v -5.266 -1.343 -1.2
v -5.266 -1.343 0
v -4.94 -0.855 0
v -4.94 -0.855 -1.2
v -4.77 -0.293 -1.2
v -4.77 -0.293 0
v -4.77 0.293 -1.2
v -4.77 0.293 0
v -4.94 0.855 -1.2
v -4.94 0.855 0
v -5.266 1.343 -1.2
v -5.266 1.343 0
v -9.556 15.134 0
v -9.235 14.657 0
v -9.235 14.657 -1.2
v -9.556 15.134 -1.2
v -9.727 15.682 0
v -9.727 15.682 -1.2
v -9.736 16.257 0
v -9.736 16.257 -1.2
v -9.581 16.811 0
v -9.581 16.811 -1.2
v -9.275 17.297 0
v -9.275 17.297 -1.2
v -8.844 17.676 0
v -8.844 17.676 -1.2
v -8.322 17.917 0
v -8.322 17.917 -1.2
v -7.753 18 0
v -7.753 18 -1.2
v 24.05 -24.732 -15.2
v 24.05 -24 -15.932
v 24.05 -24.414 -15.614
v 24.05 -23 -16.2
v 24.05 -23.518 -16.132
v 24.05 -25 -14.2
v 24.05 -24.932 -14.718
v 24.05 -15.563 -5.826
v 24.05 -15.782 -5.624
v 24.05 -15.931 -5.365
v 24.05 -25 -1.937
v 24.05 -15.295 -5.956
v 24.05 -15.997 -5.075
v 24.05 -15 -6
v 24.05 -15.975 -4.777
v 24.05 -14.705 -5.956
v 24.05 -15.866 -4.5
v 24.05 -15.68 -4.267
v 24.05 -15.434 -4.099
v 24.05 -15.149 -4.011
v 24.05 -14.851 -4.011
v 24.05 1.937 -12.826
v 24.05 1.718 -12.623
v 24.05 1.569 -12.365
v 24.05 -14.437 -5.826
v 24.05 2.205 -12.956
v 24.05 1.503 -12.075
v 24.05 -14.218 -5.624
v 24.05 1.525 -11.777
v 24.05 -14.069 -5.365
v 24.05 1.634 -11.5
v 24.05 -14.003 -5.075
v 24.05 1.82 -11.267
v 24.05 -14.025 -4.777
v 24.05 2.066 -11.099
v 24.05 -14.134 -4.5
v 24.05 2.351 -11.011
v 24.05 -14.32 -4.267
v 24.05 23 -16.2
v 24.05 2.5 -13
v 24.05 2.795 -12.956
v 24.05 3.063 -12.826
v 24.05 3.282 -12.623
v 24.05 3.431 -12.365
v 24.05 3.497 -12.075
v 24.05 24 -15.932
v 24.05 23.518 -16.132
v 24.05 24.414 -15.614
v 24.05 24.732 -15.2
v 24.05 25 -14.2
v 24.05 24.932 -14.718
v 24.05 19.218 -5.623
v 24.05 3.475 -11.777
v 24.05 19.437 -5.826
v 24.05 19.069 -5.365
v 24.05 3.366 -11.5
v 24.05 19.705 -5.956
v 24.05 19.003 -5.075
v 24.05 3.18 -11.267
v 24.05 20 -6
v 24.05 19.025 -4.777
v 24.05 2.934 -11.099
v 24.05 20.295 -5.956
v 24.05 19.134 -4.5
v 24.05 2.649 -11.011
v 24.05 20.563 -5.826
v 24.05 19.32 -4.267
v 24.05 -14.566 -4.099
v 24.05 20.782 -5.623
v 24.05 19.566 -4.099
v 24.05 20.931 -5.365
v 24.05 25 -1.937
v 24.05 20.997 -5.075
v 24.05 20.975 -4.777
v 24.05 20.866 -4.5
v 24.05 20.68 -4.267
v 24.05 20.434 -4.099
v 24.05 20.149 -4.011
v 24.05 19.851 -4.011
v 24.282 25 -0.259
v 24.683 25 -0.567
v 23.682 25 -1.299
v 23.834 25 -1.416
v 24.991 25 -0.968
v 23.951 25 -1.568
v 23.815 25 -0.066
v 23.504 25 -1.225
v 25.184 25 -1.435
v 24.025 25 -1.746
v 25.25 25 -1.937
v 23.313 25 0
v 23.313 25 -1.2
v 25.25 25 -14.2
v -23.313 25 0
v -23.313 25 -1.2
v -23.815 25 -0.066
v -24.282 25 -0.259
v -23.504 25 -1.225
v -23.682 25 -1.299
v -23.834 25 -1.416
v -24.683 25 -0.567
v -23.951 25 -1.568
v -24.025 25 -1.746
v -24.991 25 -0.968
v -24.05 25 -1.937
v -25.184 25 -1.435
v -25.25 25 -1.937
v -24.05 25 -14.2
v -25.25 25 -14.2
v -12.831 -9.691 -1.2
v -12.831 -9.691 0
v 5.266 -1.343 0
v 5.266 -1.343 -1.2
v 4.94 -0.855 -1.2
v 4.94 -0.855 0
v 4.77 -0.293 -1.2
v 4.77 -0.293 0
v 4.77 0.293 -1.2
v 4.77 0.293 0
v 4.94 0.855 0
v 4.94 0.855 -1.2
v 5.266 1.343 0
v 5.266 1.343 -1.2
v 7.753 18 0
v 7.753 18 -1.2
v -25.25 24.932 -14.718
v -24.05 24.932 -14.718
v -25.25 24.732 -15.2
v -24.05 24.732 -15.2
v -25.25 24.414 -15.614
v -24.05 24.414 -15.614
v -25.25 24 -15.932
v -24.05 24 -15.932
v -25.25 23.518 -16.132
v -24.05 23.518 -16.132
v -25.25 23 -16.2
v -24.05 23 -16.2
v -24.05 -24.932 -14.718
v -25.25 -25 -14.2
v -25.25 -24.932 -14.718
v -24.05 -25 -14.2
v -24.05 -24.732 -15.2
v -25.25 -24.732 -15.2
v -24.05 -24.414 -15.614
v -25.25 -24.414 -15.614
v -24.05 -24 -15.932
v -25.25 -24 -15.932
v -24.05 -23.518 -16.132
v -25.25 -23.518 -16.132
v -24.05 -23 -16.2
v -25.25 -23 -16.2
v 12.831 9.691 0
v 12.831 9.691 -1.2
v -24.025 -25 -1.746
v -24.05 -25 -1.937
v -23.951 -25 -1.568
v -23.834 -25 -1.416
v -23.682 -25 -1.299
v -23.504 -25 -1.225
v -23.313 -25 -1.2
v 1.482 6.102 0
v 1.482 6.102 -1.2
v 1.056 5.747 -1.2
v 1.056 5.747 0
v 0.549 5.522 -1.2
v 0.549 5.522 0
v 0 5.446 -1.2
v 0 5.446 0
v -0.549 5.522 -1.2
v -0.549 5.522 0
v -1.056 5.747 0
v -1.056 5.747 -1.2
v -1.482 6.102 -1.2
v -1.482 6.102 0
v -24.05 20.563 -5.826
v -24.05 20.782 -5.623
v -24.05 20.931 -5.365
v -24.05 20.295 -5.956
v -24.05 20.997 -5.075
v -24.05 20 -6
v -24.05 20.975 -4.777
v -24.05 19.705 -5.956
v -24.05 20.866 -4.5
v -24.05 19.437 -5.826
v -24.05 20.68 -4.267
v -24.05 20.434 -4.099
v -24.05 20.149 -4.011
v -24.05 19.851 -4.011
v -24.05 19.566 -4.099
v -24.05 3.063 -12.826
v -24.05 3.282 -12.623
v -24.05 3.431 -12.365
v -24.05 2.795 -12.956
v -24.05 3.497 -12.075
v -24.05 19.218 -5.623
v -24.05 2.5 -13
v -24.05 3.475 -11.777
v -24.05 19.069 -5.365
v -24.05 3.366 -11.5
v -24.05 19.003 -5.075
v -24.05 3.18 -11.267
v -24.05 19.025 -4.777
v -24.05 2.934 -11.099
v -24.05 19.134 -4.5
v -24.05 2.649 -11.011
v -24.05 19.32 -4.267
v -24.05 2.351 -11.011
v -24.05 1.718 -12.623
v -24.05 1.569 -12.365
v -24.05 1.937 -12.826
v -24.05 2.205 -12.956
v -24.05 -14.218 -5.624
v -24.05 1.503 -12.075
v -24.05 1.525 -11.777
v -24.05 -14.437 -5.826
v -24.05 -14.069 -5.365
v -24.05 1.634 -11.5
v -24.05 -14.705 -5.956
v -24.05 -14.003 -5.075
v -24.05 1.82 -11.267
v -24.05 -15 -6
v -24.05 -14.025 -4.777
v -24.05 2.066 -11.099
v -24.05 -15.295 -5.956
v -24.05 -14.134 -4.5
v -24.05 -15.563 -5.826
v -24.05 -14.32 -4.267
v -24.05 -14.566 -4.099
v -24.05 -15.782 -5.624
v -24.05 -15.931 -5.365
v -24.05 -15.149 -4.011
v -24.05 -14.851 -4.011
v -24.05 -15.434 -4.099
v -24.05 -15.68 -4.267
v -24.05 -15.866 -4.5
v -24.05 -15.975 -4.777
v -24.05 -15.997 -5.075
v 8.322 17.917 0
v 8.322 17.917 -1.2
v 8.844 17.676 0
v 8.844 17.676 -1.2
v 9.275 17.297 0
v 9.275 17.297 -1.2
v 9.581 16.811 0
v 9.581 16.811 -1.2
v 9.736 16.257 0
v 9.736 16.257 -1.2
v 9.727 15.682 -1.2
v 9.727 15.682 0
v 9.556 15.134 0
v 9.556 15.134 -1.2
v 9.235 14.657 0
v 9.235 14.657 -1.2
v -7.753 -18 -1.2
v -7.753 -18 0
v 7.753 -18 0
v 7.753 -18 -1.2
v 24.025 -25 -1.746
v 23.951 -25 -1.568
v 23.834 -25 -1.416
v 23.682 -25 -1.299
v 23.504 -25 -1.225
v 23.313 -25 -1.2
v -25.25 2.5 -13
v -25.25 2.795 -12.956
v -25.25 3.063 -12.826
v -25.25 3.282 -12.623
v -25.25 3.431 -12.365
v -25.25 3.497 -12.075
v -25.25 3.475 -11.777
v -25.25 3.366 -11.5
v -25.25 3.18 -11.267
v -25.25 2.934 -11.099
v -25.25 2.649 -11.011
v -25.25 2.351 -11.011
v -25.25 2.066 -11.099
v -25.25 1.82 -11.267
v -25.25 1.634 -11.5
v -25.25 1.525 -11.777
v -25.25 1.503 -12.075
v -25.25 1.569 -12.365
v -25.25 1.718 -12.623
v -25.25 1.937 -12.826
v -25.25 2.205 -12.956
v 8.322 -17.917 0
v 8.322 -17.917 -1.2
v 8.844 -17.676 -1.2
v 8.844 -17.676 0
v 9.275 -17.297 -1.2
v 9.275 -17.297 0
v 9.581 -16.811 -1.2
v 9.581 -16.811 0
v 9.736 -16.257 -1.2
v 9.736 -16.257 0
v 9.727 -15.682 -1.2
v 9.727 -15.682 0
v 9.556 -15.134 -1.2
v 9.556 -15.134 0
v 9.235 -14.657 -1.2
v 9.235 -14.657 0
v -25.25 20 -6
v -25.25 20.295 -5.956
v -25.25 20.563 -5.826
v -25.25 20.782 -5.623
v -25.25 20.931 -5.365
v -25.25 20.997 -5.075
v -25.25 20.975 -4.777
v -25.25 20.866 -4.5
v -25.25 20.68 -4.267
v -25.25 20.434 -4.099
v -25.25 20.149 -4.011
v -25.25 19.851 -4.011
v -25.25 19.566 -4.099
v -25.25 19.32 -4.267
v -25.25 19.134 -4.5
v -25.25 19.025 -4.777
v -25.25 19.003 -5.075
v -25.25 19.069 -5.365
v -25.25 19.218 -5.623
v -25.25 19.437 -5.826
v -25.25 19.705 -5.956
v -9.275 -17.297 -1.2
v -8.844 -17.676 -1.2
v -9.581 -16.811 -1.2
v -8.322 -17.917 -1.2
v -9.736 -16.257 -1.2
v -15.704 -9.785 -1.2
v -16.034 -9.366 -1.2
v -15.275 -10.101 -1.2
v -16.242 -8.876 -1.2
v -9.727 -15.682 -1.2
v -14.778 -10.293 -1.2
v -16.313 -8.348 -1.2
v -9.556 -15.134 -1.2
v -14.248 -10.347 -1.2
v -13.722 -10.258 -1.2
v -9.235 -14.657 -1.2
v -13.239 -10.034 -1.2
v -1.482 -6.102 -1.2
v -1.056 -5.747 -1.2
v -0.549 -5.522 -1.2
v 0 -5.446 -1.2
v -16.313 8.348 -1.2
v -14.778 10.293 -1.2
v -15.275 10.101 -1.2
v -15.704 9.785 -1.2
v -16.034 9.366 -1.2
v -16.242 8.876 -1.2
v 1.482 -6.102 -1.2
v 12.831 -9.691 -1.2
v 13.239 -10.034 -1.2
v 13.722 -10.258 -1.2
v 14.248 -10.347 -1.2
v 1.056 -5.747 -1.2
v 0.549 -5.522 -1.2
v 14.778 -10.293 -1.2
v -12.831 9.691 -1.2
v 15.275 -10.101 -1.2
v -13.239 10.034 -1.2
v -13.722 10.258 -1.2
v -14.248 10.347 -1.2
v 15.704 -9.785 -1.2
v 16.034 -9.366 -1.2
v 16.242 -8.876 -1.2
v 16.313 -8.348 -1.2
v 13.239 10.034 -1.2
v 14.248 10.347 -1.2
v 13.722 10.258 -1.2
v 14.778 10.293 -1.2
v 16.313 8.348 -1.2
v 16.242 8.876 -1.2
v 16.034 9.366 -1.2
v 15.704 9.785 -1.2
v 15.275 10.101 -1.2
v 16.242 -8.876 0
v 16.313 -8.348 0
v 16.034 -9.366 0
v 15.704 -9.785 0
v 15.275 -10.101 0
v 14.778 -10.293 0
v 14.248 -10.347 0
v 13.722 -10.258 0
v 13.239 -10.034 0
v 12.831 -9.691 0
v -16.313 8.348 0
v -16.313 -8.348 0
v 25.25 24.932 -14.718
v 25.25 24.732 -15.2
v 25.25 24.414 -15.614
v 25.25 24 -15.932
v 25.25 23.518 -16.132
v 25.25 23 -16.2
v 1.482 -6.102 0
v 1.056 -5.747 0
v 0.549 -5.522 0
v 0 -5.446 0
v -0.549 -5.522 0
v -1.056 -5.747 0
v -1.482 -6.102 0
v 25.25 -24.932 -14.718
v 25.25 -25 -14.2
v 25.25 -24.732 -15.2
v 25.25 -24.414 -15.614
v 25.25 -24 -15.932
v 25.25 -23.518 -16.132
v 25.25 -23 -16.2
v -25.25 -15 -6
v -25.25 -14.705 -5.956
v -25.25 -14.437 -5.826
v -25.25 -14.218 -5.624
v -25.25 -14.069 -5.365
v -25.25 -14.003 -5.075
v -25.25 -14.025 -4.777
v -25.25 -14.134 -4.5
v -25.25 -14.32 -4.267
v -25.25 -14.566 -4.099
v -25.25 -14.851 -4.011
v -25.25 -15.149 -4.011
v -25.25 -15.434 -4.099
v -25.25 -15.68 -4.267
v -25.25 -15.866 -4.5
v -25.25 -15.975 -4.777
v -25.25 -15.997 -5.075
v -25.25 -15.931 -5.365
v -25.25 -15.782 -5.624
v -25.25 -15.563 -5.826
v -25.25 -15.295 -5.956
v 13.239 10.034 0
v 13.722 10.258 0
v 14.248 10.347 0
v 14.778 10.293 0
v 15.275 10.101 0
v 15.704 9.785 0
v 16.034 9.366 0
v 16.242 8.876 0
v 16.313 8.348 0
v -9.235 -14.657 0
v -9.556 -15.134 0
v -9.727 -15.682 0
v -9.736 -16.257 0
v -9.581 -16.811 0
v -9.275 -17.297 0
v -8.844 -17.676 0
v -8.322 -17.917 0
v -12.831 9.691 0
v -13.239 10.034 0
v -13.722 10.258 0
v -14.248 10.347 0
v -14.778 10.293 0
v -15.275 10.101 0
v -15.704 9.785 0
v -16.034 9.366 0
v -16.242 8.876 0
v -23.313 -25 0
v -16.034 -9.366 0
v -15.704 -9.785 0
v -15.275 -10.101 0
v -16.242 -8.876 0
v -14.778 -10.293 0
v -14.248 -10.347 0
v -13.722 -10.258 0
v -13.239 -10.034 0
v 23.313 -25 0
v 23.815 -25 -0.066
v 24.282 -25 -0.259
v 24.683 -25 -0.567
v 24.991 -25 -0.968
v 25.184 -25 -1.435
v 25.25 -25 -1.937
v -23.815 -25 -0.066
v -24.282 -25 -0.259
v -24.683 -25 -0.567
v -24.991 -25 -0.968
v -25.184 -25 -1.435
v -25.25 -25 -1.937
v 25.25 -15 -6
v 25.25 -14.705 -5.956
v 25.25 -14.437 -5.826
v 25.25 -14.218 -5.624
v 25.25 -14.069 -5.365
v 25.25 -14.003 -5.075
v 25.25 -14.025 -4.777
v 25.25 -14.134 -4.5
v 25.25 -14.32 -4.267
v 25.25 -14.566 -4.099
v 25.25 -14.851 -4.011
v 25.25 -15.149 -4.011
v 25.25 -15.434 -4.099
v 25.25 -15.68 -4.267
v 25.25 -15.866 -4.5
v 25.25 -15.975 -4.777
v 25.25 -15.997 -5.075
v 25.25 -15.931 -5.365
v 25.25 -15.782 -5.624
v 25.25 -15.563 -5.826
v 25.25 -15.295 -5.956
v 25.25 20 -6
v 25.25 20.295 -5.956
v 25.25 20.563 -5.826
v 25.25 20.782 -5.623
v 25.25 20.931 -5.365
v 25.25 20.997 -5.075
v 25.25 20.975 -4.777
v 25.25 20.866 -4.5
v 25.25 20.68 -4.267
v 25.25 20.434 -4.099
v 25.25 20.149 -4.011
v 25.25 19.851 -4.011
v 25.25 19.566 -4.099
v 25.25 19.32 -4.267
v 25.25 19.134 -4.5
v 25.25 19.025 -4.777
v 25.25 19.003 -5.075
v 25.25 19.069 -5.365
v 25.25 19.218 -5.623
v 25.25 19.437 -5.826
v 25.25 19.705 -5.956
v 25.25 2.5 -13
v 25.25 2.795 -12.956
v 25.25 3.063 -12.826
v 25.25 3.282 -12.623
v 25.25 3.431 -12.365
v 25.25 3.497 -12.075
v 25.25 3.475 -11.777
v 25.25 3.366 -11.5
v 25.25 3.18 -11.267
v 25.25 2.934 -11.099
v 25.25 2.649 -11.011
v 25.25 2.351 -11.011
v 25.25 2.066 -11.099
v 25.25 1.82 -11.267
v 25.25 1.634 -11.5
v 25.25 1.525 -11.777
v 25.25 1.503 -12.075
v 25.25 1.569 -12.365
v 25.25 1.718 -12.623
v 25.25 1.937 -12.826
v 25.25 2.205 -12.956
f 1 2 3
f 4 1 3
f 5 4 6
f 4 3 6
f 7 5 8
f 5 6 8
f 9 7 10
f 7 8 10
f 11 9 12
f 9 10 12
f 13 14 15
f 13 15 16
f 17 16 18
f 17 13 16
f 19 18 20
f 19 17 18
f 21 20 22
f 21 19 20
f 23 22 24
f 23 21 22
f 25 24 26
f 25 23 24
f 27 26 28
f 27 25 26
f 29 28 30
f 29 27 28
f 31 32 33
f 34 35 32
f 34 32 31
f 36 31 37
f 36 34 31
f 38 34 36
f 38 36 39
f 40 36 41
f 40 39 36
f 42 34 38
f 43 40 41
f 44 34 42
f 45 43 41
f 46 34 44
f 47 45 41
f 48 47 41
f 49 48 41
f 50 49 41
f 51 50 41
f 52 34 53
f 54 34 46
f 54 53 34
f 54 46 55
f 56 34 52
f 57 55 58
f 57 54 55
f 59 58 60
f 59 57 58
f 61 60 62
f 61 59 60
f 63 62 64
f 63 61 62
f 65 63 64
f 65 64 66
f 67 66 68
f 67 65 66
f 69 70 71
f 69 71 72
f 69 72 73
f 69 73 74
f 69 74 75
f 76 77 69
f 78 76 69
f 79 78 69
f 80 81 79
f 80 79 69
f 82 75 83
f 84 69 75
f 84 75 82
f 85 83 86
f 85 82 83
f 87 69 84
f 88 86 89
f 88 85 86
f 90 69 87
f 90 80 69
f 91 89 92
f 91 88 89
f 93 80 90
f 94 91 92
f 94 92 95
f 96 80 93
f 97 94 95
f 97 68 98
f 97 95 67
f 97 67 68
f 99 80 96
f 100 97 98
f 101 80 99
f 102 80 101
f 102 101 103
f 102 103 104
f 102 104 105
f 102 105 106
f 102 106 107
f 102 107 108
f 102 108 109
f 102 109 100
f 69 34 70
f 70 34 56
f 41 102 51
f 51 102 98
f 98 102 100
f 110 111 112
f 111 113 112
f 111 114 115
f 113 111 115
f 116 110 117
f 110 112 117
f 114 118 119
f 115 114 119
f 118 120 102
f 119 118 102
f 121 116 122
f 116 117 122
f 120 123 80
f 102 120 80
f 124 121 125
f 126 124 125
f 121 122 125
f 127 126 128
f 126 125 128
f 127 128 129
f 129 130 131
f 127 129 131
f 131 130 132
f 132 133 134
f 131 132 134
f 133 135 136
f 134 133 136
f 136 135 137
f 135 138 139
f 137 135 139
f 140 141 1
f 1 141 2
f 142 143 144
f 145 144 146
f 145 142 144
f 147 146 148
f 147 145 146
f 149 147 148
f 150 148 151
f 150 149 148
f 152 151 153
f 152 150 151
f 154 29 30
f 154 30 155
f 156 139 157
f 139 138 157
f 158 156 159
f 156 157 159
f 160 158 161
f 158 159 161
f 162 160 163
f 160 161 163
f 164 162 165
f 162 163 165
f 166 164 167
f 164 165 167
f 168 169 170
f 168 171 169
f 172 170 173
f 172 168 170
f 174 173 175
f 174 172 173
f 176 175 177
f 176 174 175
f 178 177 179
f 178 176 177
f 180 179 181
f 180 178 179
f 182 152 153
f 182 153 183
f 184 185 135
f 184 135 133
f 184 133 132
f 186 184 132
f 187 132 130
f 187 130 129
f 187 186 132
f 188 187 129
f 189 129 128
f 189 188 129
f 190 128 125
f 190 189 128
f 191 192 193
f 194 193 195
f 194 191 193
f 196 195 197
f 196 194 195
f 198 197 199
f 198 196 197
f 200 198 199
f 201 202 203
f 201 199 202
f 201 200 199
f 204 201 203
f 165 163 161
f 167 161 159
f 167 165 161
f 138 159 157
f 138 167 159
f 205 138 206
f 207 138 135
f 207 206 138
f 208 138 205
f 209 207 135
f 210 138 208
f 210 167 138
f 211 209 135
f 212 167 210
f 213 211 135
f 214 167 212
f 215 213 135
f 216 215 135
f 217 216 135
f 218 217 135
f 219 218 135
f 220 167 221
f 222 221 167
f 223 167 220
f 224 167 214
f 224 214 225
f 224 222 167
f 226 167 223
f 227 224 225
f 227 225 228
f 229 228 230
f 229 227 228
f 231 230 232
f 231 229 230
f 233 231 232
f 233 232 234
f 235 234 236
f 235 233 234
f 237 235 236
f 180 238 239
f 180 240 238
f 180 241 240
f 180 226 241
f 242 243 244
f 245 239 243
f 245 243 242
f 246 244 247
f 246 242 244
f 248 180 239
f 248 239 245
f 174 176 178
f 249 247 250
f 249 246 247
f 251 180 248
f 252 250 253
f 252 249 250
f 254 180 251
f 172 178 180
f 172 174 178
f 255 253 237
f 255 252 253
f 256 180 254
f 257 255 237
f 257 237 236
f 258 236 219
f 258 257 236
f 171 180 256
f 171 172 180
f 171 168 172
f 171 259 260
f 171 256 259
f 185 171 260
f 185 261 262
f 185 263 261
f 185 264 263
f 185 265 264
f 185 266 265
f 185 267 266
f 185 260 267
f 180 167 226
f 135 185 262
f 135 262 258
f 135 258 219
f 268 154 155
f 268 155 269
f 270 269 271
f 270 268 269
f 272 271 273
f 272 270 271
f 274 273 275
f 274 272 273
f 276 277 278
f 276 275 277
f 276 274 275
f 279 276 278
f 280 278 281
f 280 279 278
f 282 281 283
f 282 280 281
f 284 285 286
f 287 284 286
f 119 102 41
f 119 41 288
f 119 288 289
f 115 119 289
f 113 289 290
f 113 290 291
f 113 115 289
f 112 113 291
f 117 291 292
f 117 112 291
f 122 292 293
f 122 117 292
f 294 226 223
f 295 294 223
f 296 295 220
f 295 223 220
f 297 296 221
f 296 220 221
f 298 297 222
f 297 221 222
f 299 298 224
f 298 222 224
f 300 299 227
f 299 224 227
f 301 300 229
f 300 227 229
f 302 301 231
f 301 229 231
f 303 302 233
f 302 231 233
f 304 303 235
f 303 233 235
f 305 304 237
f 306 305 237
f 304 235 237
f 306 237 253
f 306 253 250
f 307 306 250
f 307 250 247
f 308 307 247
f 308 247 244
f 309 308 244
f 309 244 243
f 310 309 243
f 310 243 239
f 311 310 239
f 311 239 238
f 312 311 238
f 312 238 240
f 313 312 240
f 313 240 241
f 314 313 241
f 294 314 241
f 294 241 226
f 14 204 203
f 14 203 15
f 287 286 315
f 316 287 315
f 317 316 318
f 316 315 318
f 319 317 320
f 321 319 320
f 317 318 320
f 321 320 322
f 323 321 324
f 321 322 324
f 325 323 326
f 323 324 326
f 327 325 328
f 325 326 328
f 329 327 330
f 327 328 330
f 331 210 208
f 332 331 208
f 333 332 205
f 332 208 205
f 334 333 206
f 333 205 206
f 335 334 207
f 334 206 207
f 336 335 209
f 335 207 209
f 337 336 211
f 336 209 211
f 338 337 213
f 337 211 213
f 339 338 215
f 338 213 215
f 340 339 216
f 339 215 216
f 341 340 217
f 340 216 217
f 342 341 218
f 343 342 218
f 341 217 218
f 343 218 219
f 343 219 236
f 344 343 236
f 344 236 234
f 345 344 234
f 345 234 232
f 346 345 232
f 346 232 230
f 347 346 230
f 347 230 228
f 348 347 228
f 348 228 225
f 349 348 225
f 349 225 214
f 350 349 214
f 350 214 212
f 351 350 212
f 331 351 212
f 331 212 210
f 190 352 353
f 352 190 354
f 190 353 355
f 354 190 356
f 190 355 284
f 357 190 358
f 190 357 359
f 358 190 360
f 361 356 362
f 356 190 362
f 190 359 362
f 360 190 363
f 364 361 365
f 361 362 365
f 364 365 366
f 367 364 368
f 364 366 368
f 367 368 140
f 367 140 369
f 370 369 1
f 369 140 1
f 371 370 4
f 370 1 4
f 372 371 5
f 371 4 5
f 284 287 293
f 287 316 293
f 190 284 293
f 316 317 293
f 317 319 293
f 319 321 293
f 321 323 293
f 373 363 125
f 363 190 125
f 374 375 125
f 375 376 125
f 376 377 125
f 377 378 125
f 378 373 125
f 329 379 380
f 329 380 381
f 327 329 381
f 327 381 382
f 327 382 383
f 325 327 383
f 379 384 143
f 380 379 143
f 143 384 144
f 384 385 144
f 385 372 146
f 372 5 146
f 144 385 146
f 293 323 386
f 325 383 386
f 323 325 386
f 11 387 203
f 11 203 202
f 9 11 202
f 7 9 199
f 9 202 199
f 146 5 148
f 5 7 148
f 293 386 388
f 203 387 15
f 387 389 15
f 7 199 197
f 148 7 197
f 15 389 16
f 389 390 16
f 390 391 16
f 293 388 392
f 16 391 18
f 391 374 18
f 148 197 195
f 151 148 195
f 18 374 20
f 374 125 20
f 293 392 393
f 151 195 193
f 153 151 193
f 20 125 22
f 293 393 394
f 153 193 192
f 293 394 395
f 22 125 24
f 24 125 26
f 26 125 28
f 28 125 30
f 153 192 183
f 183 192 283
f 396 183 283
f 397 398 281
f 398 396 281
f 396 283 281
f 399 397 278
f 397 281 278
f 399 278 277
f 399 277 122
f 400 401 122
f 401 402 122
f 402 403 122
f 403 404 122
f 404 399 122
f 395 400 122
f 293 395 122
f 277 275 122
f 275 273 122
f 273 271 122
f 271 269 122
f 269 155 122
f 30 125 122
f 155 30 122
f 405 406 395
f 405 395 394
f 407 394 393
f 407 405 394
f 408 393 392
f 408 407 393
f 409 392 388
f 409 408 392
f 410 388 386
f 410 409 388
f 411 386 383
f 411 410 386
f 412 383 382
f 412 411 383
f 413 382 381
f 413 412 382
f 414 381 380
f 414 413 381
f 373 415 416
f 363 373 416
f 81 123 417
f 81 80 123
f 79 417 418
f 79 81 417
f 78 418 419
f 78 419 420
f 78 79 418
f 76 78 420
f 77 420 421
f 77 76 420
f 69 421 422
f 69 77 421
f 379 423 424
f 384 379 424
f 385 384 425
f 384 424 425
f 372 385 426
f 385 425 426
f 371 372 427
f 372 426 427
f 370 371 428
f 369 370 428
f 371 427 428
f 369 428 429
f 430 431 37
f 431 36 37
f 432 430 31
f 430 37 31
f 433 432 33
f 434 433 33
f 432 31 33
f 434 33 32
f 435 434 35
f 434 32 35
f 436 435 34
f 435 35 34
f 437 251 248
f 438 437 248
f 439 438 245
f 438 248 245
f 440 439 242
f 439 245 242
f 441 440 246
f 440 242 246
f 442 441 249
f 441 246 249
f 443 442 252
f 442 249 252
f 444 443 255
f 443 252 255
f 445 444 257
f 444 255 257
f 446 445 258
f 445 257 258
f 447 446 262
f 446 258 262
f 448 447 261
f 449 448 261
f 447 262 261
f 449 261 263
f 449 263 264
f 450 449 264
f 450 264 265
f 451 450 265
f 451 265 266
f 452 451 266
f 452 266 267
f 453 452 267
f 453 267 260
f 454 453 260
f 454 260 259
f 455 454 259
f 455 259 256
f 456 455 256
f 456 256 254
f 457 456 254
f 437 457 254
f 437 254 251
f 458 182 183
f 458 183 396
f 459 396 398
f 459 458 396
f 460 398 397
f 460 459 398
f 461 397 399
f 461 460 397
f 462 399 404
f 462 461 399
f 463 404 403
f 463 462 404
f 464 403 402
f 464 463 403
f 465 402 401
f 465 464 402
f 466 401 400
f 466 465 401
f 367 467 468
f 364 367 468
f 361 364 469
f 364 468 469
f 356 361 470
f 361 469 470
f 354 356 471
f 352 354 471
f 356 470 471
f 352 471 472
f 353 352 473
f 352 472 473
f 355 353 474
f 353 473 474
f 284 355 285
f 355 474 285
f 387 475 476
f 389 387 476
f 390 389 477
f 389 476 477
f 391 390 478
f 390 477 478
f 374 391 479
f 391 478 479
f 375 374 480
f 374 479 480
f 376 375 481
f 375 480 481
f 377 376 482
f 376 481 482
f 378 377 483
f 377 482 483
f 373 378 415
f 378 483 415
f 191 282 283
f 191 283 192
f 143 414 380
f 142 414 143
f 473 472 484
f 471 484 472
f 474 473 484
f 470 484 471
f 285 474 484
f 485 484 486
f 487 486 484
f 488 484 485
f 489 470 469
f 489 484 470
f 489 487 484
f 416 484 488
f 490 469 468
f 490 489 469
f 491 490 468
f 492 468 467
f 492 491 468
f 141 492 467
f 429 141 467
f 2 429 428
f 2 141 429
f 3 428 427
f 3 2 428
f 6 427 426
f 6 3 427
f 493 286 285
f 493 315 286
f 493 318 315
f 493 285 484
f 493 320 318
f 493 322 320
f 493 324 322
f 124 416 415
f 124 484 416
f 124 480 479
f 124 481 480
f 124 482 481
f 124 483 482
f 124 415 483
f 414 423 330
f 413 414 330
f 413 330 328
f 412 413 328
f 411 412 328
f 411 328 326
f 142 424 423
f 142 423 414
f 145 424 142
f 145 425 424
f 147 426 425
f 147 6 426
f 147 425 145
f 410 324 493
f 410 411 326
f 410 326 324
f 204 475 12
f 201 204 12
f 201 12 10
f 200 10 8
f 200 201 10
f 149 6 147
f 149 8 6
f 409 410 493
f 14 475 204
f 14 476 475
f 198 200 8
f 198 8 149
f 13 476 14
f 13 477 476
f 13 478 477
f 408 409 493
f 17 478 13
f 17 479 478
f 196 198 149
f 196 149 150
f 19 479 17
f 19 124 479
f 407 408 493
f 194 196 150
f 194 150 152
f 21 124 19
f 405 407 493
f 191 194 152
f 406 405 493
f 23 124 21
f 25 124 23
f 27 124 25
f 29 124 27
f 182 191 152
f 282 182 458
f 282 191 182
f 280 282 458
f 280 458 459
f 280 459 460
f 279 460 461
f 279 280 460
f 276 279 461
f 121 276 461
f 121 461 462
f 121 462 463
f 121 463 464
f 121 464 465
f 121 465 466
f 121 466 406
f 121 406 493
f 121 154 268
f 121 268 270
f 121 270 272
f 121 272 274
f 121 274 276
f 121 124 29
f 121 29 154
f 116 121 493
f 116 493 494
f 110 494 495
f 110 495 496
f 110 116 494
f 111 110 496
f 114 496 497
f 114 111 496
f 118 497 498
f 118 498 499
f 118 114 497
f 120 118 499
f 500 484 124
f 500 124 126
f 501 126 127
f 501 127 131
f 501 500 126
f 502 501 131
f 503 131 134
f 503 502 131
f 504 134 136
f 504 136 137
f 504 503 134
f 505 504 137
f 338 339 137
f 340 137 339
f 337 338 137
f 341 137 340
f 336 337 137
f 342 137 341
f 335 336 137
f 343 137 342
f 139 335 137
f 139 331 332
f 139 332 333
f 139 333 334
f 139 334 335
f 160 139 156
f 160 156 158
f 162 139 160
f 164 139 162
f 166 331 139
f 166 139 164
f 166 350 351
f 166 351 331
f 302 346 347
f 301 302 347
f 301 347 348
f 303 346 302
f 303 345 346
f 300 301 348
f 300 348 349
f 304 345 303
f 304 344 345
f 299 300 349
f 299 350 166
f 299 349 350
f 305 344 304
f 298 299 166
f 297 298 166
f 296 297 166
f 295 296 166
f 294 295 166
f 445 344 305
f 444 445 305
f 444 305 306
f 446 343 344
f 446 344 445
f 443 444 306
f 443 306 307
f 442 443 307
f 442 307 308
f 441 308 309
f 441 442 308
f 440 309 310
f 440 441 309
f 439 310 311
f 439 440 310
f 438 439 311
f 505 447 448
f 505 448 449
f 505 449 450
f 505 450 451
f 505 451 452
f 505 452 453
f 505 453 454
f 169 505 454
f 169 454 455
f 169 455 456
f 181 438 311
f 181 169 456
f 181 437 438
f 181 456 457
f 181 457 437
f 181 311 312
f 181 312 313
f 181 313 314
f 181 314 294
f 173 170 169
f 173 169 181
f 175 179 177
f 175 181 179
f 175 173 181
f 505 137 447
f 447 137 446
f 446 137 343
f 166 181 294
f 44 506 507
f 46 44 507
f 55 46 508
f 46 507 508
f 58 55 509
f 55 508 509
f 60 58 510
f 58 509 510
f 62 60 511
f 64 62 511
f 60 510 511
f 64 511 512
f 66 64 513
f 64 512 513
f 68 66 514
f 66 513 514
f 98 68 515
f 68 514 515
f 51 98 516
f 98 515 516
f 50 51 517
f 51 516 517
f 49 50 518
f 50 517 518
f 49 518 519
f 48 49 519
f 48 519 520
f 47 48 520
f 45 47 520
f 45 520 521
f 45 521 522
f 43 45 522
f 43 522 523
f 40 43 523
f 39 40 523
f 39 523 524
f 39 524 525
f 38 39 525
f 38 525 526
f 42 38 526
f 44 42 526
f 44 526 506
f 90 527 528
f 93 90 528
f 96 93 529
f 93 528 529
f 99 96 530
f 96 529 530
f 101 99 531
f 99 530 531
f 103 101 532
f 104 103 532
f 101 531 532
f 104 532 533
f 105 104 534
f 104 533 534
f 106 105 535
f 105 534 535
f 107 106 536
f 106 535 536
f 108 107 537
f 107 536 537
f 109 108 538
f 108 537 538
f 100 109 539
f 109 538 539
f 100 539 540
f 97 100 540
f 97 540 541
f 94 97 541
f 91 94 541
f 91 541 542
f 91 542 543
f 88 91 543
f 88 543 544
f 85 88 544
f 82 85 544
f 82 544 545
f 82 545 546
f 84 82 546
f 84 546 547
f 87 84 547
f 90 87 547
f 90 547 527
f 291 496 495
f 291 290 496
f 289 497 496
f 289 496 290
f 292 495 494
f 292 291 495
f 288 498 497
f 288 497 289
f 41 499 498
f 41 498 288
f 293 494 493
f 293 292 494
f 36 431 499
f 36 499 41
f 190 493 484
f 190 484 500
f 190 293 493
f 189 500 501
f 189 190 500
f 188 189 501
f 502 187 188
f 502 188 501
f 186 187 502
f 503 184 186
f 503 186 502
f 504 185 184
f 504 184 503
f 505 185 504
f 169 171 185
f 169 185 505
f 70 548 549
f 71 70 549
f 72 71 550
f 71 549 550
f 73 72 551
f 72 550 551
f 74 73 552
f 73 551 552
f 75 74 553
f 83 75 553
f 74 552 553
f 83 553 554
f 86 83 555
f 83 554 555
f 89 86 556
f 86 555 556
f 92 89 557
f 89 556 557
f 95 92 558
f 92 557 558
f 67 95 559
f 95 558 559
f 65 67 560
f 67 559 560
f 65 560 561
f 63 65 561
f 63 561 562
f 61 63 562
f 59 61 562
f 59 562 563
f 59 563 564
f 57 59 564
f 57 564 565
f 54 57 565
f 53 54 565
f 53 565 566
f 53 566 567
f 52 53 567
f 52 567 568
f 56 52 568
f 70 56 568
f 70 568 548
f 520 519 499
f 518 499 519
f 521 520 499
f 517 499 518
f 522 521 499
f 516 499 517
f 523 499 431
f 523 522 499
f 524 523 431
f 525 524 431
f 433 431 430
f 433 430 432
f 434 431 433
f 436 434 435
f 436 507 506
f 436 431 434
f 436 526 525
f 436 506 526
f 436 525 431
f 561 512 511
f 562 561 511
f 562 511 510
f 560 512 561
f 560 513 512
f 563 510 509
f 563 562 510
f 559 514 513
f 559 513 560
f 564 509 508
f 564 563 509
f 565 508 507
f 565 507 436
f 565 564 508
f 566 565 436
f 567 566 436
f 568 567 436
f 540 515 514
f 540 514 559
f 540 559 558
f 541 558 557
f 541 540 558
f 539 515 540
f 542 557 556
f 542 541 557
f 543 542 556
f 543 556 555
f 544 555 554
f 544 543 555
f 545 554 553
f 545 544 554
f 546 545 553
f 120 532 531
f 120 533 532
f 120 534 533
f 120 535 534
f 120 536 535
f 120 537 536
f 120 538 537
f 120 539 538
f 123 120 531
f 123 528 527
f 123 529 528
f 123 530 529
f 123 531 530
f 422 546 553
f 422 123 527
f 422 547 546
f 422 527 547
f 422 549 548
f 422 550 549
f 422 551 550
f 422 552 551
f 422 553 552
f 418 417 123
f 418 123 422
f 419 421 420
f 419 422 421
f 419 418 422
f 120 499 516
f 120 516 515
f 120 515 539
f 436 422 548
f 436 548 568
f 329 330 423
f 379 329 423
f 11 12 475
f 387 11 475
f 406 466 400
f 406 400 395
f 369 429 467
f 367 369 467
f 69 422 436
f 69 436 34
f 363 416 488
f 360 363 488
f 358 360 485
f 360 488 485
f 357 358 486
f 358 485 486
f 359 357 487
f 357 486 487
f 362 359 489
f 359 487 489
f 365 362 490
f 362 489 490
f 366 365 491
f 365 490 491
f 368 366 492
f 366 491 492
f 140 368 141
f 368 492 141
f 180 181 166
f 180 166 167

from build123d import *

# Parameters (mm, degrees)
SKETCH_1_W                         = 48.1
SKETCH_1_H                         = 50
SM_BASE_FLANGE_1_DEPTH             = 1.2
SM_EDGE_FLANGE_1_STRIP_W           = 6.2732
SM_EDGE_FLANGE_1_STRIP_H           = 1.2
SM_EDGE_FLANGE_1_STRIP_CUT_DEPTH   = 50
SM_EDGE_FLANGE_1_STRIP_2_W         = 6.2732
SM_EDGE_FLANGE_1_STRIP_2_H         = 1.2
SM_EDGE_FLANGE_1_STRIP_CUT_2_DEPTH = 50
SM_EDGE_FLANGE_1_DEPTH             = 50
SM_EDGE_FLANGE_1_BEND_DEPTH        = 50
CUT_EXTRUDE_1_DEPTH                = 10
SKETCH_17_R                        = 1
CUT_EXTRUDE_2_DEPTH                = 59.631817301
FILLET_1_R                         = 2


# Sheet-metal steps are written as plain solids
with BuildPart() as part:
    # Sketch 1 → 基材-凸緣1 (new body)
    with BuildSketch(Plane.XY):
        Rectangle(SKETCH_1_W, SKETCH_1_H)
    extrude(amount=-SM_BASE_FLANGE_1_DEPTH)

    # 邊線-凸緣1 strip (across the edge) → 邊線-凸緣1 strip cut (cut)
    with BuildSketch(Plane(origin=(24.05, 25, -1.2), x_dir=(-1, 0, 0), z_dir=(0, -1, 0))):
        with Locations((-2.4, -0.6)):
            Rectangle(SM_EDGE_FLANGE_1_STRIP_W, SM_EDGE_FLANGE_1_STRIP_H)
    extrude(amount=SM_EDGE_FLANGE_1_STRIP_CUT_DEPTH, mode=Mode.SUBTRACT)

    # 邊線-凸緣1 strip 2 (across the edge) → 邊線-凸緣1 strip cut 2 (cut)
    with BuildSketch(Plane(origin=(-24.05, -25, -1.2), x_dir=(1, 0, 0), z_dir=(0, 1, 0))):
        with Locations((-2.4, -0.6)):
            Rectangle(SM_EDGE_FLANGE_1_STRIP_2_W, SM_EDGE_FLANGE_1_STRIP_2_H)
    extrude(amount=SM_EDGE_FLANGE_1_STRIP_CUT_2_DEPTH, mode=Mode.SUBTRACT)

    # 邊線-凸緣1 section (across the edge) → 邊線-凸緣1 (add)
    with BuildSketch(Plane(origin=(24.05, 25, -1.2), x_dir=(-1, 0, 0), z_dir=(0, -1, 0))):
        with BuildLine():
            Line((-1.2, 0.7366), (-1.2, 15))
            Line((-1.2, 15), (0, 15))
            Line((0, 15), (0, 0.7366))
            ThreePointArc((0, 0.7366), (0.215745145, 0.215745145), (0.7366, 0))
            Line((0.7366, 0), (0.7366, -1.2))
            ThreePointArc((0.7366, -1.2), (-0.632782992, -0.632782992), (-1.2, 0.7366))
        make_face()
    extrude(amount=SM_EDGE_FLANGE_1_DEPTH)

    # 邊線-凸緣1 section 2 (across the edge) → 邊線-凸緣1 bend (add)
    with BuildSketch(Plane(origin=(-24.05, -25, -1.2), x_dir=(1, 0, 0), z_dir=(0, 1, 0))):
        with BuildLine():
            Line((-1.2, 0.7366), (-1.2, 15))
            Line((-1.2, 15), (0, 15))
            Line((0, 15), (0, 0.7366))
            ThreePointArc((0, 0.7366), (0.215745145, 0.215745145), (0.7366, 0))
            Line((0.7366, 0), (0.7366, -1.2))
            ThreePointArc((0.7366, -1.2), (-0.632782992, -0.632782992), (-1.2, 0.7366))
        make_face()
    extrude(amount=SM_EDGE_FLANGE_1_BEND_DEPTH)

    # 草圖14 → 除料-伸長1 (cut)
    with BuildSketch(Plane.XY):
        with BuildLine():
            Line((-7.752874967, 18), (7.752874967, 18))
            ThreePointArc((7.752874967, 18), (9.581283984, 16.810506303), (9.234812, 14.656920467))
            Line((9.234812, 14.656920467), (1.481937033, 6.10249592))
            ThreePointArc((1.481937033, 6.10249592), (0, 5.445575453), (-1.481937033, 6.10249592))
            Line((-1.481937033, 6.10249592), (-9.234812, 14.656920467))
            ThreePointArc((-9.234812, 14.656920467), (-9.581283984, 16.810506303), (-7.752874967, 18))
        make_face()
        with BuildLine():
            Line((-16.3134, 8.347649749), (-16.3134, -8.347649749))
            ThreePointArc((-16.3134, -8.347649749), (-15.033165911, -10.213644666), (-12.831462967, -9.690729281))
            Line((-12.831462967, -9.690729281), (-5.265988, -1.343079533))
            ThreePointArc((-5.265988, -1.343079533), (-4.747925033, 0), (-5.265988, 1.343079533))
            Line((-5.265988, 1.343079533), (-12.831462967, 9.690729281))
            ThreePointArc((-12.831462967, 9.690729281), (-15.033165911, 10.213644666), (-16.3134, 8.347649749))
        make_face()
        with BuildLine():
            Line((-7.752874967, -18), (7.752874967, -18))
            ThreePointArc((7.752874967, -18), (9.581283984, -16.810506303), (9.234812, -14.656920467))
            Line((9.234812, -14.656920467), (1.481937033, -6.10249592))
            ThreePointArc((1.481937033, -6.10249592), (0, -5.445575453), (-1.481937033, -6.10249592))
            Line((-1.481937033, -6.10249592), (-9.234812, -14.656920467))
            ThreePointArc((-9.234812, -14.656920467), (-9.581283984, -16.810506303), (-7.752874967, -18))
        make_face()
        with BuildLine():
            Line((16.3134, 8.347649749), (16.3134, -8.347649749))
            ThreePointArc((16.3134, -8.347649749), (15.033165911, -10.213644666), (12.831462967, -9.690729281))
            Line((12.831462967, -9.690729281), (5.265988, -1.343079533))
            ThreePointArc((5.265988, -1.343079533), (4.747925033, 0), (5.265988, 1.343079533))
            Line((5.265988, 1.343079533), (12.831462967, 9.690729281))
            ThreePointArc((12.831462967, 9.690729281), (15.033165911, 10.213644666), (16.3134, 8.347649749))
        make_face()
    extrude(amount=-CUT_EXTRUDE_1_DEPTH, mode=Mode.SUBTRACT)

    # 草圖17 → 除料-伸長2 (cut, through all)
    with BuildSketch(Plane(origin=(25.25, 0, 0), x_dir=(0, 0, -1), z_dir=(1, 0, 0))):
        with Locations((5, 20)):
            Circle(SKETCH_17_R)
        with Locations((5.000020411, -15)):
            Circle(SKETCH_17_R)
        with Locations((12, 2.5)):
            Circle(SKETCH_17_R)
    extrude(amount=-CUT_EXTRUDE_2_DEPTH, mode=Mode.SUBTRACT)

    # 圓角1
    fillet_1_edges = [part.edges().sort_by_distance(p)[0] for p in [
        (24.65, 25, -16.2),
        (24.65, -25, -16.2),
        (-24.65, -25, -16.2),
        (-24.65, 25, -16.2),
    ]]
    fillet(fillet_1_edges, radius=FILLET_1_R)


solid = part.part
